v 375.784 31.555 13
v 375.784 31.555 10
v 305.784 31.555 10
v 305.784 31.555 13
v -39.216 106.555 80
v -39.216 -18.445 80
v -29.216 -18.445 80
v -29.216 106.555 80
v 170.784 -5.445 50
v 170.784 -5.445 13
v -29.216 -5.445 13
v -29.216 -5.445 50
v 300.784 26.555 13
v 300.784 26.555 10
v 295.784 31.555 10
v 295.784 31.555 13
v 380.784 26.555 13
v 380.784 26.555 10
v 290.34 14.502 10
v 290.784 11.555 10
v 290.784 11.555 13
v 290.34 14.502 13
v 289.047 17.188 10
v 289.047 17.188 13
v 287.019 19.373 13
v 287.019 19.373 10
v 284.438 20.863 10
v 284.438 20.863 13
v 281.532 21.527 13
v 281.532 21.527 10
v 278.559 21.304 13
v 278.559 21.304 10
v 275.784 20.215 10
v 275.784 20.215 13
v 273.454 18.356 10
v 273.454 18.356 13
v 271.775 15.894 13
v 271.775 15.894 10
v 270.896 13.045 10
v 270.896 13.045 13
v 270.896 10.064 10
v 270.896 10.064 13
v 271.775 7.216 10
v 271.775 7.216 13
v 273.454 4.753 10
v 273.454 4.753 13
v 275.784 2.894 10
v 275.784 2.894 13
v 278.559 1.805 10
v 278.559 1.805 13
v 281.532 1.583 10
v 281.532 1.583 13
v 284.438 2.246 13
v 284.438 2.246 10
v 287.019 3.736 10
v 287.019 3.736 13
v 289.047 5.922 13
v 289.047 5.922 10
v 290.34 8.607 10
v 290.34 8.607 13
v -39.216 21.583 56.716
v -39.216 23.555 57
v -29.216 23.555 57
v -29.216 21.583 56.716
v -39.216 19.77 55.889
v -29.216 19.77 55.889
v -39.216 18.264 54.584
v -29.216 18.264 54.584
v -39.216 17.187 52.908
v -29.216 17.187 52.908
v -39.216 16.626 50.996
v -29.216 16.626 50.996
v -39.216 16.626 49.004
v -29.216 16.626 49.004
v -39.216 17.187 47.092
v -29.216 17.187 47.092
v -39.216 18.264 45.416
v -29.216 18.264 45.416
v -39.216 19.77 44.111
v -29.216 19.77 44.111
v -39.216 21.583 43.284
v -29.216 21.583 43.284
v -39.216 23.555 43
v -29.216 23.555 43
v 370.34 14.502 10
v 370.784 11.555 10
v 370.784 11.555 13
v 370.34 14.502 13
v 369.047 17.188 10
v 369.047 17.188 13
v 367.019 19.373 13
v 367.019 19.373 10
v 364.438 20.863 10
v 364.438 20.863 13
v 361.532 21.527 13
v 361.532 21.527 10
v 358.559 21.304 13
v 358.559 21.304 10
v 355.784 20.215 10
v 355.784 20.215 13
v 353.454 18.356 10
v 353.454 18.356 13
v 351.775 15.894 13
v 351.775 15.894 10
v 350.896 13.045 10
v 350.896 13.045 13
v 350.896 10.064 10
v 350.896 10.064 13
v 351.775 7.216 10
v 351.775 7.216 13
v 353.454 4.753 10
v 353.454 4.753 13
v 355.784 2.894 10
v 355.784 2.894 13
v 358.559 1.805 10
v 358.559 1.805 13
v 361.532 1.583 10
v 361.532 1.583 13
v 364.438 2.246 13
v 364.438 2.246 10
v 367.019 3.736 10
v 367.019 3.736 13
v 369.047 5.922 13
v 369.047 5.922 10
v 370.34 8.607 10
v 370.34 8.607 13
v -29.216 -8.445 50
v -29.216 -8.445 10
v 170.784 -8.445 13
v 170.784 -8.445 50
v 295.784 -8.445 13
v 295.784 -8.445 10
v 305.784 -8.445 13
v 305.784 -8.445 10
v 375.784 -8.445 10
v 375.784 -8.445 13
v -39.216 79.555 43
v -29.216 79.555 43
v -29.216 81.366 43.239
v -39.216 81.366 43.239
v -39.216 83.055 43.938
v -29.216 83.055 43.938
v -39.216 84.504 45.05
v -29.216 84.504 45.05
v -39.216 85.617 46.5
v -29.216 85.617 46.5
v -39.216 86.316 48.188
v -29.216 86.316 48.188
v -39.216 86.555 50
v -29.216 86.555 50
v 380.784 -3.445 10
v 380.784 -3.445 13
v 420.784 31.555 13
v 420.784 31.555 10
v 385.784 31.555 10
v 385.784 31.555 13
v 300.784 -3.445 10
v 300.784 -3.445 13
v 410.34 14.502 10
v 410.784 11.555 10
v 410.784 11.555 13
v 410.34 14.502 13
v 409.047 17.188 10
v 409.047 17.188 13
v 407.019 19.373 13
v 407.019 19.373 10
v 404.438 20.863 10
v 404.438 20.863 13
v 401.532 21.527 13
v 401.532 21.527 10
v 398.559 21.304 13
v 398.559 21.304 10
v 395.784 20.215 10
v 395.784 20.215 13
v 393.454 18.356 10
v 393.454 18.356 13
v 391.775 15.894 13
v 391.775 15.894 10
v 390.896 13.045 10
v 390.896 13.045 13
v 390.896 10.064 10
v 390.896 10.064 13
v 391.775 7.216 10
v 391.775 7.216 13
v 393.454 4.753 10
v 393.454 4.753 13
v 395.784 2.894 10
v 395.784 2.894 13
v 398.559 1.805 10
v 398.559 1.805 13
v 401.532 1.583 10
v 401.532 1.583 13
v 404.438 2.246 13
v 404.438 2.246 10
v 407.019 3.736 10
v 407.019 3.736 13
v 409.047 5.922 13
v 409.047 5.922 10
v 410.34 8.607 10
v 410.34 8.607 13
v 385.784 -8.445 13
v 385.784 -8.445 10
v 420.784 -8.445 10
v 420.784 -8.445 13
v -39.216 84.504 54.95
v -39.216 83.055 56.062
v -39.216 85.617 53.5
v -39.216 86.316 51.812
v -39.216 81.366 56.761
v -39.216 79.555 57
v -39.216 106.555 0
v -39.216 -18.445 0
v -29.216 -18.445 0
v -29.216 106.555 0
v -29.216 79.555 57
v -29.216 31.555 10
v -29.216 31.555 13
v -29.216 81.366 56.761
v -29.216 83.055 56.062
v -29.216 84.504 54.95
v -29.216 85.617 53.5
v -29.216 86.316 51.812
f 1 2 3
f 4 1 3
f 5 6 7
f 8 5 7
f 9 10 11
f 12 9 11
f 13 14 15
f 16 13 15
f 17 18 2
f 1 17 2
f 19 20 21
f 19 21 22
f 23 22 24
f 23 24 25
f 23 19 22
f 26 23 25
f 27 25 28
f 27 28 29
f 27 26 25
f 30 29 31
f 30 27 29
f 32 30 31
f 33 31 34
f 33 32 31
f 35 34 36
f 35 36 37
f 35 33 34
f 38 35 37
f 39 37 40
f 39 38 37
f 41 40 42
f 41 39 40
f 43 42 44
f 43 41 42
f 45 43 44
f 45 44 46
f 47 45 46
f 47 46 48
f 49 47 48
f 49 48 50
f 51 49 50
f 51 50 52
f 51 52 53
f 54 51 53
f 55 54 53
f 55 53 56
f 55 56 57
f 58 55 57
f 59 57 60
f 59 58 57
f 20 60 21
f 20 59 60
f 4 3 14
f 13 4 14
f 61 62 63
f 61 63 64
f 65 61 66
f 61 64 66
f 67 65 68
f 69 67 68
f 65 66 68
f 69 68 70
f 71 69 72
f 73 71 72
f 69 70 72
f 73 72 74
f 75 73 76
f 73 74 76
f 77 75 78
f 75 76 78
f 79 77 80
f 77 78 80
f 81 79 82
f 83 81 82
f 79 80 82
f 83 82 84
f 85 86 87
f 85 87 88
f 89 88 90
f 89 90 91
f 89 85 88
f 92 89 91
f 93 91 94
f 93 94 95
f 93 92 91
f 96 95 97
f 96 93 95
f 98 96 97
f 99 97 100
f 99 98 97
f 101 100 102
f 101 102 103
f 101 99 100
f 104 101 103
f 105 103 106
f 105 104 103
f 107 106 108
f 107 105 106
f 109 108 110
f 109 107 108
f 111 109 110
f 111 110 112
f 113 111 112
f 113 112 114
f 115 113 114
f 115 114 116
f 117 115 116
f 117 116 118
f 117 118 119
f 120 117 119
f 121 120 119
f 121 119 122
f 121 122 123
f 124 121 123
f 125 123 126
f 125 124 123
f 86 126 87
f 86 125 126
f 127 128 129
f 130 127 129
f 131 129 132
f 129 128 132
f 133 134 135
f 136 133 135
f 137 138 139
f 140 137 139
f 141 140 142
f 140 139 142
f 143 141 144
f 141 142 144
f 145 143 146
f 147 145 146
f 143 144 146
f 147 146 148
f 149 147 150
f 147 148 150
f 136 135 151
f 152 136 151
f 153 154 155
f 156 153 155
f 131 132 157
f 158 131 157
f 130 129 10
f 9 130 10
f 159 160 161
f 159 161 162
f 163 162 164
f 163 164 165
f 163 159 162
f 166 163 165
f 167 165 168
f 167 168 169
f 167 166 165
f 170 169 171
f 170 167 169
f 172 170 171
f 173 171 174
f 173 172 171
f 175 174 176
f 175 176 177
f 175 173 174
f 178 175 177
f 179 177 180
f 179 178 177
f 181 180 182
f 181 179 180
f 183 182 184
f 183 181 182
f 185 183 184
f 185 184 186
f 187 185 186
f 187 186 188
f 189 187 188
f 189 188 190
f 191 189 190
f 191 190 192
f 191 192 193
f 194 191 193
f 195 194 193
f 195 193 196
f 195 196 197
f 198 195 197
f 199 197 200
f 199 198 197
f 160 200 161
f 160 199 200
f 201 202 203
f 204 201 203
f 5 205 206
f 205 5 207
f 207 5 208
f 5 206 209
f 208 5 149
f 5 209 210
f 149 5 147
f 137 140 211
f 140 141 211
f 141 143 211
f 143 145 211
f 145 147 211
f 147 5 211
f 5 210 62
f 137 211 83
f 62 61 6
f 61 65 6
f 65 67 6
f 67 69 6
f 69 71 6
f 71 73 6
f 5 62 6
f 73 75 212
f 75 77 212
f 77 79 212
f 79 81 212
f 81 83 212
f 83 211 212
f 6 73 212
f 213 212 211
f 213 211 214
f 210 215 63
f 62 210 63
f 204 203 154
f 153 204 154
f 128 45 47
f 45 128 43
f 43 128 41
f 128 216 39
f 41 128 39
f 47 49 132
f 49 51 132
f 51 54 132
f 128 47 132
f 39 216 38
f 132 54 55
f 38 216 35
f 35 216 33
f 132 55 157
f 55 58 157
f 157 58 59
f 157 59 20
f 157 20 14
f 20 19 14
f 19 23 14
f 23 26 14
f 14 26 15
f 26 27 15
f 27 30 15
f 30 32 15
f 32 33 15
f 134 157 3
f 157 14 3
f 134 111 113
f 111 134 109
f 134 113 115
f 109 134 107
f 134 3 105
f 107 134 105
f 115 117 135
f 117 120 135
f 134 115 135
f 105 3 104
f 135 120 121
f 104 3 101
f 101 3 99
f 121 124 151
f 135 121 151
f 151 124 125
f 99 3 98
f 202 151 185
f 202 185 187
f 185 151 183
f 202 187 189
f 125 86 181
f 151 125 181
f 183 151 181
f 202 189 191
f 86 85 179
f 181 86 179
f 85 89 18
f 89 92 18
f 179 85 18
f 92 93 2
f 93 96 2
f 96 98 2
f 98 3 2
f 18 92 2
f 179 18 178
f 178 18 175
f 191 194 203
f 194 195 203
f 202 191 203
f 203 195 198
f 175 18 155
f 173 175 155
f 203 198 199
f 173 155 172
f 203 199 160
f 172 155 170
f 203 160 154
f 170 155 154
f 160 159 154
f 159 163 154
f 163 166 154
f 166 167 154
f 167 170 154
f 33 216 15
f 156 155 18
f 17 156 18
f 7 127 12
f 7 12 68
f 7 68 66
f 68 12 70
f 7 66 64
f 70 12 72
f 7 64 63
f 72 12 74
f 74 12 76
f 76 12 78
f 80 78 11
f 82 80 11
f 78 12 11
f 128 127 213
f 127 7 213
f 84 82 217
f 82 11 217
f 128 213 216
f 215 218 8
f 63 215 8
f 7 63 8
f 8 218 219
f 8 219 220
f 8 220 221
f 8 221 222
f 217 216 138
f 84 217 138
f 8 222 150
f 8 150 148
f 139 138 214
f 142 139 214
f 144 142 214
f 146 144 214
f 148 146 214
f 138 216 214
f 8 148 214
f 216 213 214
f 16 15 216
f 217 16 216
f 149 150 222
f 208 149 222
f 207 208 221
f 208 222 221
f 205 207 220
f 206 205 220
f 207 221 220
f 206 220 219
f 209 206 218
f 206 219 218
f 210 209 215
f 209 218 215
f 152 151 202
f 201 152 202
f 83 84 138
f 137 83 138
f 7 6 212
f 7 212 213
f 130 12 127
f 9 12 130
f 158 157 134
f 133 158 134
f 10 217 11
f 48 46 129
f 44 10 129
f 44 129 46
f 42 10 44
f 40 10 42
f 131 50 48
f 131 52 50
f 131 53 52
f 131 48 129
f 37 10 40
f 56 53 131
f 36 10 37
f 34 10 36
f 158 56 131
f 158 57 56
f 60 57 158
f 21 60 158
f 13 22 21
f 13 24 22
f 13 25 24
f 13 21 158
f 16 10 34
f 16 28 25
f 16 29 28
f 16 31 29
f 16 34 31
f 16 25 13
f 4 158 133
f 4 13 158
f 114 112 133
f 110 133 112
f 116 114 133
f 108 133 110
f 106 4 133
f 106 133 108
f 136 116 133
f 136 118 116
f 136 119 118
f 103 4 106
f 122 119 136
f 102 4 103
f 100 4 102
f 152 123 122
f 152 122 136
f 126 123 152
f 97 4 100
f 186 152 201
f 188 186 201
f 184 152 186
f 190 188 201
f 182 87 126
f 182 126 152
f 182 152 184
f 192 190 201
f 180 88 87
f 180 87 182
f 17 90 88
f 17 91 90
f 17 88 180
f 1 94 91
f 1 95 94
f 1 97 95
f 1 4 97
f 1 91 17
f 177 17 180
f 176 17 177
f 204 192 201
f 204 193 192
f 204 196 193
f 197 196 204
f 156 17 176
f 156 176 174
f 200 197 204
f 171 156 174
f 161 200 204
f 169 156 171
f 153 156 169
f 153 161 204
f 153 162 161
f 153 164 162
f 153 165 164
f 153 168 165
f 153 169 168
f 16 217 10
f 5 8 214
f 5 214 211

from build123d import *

# Parameters (mm, degrees)
F1_DEPTH = 80
F2_START = 10
F0_R     = 10
F2_DEPTH = 3
F3_START = 10
F3_DEPTH = 40
F5_DEPTH = 25


with BuildPart() as f1:
    # F0 (on Top) → F1 (new body)
    with BuildSketch(Plane.XY):
        Polygon((-39.2155684531, 106.5547373146), (-39.2155684531, -18.4452626854), (-29.2155684531, -18.4452626854), (-29.2155684531, -8.4452626854), (-29.2155684531, -5.4452626854), (-29.2155684531, 31.5547373146), (-29.2155684531, 106.5547373146), align=None)
    extrude(amount=F1_DEPTH)

    # F0 (on Top) → F2 (join)
    with BuildSketch(Plane.XY.offset(F2_START)):
        Polygon((-29.2155684531, 31.5547373146), (-29.2155684531, -5.4452626854), (170.7844315469, -5.4452626854), (170.7844315469, -8.4452626854), (295.7844315469, -8.4452626854), (300.7844315469, -3.4452626854), (305.7844315469, -8.4452626854), (375.7844315469, -8.4452626854), (380.7844315469, -3.4452626854), (385.7844315469, -8.4452626854), (420.7844315469, -8.4452626854), (420.7844315469, 31.5547373146), (385.7844315469, 31.5547373146), (380.7844315469, 26.5547373146), (375.7844315469, 31.5547373146), (305.7844315469, 31.5547373146), (300.7844315469, 26.5547373146), (295.7844315469, 31.5547373146), align=None)
        with Locations((280.7844315469, 11.5547373146)):
            Circle(F0_R, mode=Mode.SUBTRACT)
        with Locations((360.7844315469, 11.5547373146)):
            Circle(F0_R, mode=Mode.SUBTRACT)
        with Locations((400.7844315469, 11.5547373146)):
            Circle(F0_R, mode=Mode.SUBTRACT)
    extrude(amount=F2_DEPTH)

    # F0 (on Top) → F3 (join)
    with BuildSketch(Plane.XY.offset(F3_START)):
        Polygon((-29.2155684531, -5.4452626854), (-29.2155684531, -8.4452626854), (-19.2155684531, -8.4452626854), (170.7844315469, -8.4452626854), (170.7844315469, -5.4452626854), align=None)
    extrude(amount=F3_DEPTH)

    # F4 (on face) → F5 (cut)
    with BuildSketch(Plane.YZ.offset(-29.2155684531)):
        with BuildLine():
            ThreePointArc((23.5547373146, 57), (28.5044847829, 54.9497474683), (30.5547373146, 50))
            ThreePointArc((30.5547373146, 50), (28.5044847829, 45.0502525317), (23.5547373146, 43))
            Line((23.5547373146, 43), (79.5547373146, 43))
            ThreePointArc((79.5547373146, 43), (72.5547373146, 50), (79.5547373146, 57))
            Line((79.5547373146, 57), (23.5547373146, 57))
        make_face()
        with BuildLine():
            ThreePointArc((23.5547373146, 43), (28.5044847829, 45.0502525317), (30.5547373146, 50))
            ThreePointArc((30.5547373146, 50), (28.5044847829, 54.9497474683), (23.5547373146, 57))
            ThreePointArc((23.5547373146, 57), (16.5547373146, 50), (23.5547373146, 43))
        make_face()
        with BuildLine():
            ThreePointArc((86.5547373146, 50), (84.5044847829, 54.9497474683), (79.5547373146, 57))
            ThreePointArc((79.5547373146, 57), (72.5547373146, 50), (79.5547373146, 43))
            ThreePointArc((79.5547373146, 43), (84.5044847829, 45.0502525317), (86.5547373146, 50))
        make_face()
    extrude(amount=-F5_DEPTH, mode=Mode.SUBTRACT)


solid = f1.part
